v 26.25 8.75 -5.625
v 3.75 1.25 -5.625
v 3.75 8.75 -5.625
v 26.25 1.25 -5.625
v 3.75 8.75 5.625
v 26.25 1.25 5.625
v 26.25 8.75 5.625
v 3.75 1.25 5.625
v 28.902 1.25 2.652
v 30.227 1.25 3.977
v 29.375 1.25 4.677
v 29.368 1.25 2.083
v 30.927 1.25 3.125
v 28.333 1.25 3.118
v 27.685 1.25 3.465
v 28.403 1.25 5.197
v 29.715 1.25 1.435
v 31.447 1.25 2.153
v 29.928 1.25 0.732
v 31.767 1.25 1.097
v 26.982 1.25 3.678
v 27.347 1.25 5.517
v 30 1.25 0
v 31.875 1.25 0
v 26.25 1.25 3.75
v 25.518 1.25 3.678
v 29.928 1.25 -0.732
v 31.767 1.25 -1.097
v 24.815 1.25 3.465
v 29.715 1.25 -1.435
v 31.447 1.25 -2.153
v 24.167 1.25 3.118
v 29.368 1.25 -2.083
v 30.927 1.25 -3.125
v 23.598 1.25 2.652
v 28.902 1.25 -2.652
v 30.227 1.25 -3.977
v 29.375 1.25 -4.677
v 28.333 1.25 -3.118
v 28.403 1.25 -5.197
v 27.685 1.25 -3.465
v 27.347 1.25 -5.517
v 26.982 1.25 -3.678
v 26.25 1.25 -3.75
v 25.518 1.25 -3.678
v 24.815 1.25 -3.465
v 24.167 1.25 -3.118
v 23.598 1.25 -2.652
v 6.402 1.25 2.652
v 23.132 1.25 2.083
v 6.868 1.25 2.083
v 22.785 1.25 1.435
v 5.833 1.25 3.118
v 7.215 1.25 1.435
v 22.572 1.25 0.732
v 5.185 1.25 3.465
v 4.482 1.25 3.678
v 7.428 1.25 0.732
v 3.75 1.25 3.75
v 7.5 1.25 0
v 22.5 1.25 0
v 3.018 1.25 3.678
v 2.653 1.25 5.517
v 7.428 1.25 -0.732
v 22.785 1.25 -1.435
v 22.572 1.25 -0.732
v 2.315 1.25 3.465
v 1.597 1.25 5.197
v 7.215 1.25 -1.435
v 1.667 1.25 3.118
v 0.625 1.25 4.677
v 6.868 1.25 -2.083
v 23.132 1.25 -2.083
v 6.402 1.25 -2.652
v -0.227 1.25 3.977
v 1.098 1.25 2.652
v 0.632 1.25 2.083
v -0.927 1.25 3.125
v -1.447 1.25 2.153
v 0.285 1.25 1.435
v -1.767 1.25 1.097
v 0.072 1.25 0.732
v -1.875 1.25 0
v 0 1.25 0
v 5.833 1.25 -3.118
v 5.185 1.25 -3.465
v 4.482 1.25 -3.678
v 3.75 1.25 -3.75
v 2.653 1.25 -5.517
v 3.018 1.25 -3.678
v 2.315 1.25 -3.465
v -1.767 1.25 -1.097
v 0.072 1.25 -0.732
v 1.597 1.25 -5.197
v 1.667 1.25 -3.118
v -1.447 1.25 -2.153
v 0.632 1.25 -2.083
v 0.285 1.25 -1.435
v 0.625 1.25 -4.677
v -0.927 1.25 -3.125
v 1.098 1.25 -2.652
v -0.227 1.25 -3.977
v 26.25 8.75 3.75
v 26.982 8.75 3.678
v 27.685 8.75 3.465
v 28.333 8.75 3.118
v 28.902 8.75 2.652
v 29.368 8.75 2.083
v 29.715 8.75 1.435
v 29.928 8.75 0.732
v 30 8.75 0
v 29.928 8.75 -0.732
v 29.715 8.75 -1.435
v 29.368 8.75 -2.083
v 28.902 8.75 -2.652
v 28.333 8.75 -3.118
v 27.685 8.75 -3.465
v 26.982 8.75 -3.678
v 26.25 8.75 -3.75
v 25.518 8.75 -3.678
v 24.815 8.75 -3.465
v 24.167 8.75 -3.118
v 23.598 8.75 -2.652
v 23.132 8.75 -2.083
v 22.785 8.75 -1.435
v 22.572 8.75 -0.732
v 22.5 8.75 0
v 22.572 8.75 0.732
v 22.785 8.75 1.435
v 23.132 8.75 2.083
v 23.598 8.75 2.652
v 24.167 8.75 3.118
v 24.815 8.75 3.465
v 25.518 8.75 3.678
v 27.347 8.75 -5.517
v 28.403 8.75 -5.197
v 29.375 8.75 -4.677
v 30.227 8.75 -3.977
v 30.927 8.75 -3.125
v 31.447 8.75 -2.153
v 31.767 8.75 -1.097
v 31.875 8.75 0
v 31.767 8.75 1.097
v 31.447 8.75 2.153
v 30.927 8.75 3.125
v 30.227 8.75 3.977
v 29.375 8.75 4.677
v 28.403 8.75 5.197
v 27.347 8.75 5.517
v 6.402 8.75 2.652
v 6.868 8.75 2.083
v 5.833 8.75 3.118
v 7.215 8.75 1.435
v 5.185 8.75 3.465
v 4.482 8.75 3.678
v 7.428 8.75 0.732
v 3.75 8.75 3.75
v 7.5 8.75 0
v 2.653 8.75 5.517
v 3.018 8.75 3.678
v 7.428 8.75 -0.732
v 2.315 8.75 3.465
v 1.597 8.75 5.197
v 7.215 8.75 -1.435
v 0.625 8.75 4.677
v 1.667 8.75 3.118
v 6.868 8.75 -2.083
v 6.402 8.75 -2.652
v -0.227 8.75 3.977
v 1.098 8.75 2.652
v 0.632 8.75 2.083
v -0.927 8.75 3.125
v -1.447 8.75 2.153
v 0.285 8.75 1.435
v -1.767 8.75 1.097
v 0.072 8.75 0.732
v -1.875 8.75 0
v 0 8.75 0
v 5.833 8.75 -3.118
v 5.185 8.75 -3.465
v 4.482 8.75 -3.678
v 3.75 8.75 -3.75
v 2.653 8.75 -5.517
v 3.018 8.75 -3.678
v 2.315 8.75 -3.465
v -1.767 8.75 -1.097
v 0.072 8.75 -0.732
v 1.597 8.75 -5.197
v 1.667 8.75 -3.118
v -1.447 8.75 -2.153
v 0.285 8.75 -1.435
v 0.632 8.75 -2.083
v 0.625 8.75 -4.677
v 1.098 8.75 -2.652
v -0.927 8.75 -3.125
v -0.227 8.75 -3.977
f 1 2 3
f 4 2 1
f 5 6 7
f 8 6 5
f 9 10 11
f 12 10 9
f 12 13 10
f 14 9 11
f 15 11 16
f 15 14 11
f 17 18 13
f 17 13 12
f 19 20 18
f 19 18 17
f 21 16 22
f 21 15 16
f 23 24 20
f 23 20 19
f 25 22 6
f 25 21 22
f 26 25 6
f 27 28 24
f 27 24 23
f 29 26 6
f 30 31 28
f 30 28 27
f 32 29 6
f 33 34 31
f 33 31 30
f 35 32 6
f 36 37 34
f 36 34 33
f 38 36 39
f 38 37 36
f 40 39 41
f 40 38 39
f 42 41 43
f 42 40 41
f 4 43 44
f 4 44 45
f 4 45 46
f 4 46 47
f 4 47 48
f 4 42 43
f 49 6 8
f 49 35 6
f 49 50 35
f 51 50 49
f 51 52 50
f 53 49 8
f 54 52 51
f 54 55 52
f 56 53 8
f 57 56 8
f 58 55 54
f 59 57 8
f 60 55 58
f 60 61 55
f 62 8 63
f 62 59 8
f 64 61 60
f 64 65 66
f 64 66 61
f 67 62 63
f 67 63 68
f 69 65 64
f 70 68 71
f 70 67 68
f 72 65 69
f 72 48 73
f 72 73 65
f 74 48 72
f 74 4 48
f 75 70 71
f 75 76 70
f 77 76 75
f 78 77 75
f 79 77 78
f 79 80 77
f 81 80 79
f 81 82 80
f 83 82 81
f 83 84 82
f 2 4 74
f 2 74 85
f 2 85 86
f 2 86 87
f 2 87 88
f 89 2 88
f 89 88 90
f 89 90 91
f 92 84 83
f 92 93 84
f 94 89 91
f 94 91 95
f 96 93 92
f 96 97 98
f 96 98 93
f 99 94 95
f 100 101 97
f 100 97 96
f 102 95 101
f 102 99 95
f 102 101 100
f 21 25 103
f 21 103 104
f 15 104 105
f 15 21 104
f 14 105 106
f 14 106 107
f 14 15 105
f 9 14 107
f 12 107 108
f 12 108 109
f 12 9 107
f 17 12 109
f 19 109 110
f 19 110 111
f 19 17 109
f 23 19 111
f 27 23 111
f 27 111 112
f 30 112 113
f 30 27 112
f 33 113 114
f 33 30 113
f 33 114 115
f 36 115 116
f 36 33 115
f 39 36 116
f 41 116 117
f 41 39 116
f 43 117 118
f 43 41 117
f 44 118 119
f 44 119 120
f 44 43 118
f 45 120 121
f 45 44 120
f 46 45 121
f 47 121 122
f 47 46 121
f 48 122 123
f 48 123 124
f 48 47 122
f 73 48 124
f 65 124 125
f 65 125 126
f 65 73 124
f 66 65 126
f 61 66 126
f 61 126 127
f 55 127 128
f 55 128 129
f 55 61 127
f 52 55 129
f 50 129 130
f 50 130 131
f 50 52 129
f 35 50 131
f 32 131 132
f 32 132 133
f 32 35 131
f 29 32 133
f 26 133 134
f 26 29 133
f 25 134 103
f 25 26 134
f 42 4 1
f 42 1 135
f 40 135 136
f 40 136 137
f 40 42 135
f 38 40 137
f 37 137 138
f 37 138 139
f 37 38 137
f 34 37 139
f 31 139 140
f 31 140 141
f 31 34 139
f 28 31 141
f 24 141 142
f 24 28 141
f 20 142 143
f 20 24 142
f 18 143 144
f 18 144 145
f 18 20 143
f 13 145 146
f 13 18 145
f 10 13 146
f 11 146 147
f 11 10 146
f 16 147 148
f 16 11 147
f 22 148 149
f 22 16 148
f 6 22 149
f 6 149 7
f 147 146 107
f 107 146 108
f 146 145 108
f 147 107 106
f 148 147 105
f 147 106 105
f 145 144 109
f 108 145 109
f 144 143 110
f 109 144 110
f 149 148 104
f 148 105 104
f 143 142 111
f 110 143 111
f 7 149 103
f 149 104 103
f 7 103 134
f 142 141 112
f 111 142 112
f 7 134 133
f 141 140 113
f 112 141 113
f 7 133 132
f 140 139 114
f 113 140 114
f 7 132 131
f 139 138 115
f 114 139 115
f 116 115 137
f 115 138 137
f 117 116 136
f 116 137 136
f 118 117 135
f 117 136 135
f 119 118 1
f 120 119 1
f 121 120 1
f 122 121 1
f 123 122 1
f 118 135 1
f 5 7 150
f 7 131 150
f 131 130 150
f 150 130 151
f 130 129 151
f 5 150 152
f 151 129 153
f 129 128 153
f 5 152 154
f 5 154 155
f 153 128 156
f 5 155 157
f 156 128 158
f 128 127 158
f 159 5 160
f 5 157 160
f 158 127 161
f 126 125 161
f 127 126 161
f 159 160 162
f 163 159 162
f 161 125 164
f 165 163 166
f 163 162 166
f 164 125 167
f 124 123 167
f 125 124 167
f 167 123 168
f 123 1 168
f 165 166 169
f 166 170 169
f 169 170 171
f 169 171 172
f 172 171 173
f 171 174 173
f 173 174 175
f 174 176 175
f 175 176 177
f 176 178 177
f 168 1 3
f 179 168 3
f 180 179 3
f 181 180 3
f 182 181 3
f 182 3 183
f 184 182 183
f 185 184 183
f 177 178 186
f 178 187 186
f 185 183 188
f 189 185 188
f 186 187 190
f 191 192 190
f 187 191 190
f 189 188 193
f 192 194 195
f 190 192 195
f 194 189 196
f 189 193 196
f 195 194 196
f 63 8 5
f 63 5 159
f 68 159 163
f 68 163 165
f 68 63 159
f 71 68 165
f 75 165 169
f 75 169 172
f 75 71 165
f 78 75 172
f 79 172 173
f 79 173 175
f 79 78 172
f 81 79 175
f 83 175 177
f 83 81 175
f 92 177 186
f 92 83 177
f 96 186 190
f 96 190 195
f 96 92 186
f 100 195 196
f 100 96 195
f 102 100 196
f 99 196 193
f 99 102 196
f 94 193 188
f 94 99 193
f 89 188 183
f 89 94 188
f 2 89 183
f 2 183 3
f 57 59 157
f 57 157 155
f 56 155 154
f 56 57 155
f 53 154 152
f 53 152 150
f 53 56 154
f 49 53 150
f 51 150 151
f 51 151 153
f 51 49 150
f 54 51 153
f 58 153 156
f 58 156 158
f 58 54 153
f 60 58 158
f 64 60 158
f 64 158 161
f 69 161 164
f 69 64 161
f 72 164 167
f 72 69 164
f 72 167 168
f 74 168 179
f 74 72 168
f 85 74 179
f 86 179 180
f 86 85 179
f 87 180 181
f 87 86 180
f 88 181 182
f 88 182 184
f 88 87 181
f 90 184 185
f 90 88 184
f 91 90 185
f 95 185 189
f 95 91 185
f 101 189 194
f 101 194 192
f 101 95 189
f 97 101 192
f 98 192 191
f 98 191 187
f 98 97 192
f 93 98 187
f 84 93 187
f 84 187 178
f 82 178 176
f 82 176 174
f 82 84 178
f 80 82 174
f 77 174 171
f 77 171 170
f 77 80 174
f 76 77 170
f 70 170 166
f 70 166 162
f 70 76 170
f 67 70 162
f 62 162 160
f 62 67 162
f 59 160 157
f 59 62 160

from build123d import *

# Parameters (mm, degrees)
CROQUIS1_R              = 5
SALIENTE_EXTRUIR1_DEPTH = 10
ESCALA1_SCALE           = 0.75


with BuildPart() as part:
    # Croquis1 → Saliente-Extruir1 (new body)
    with BuildSketch(Plane(origin=(0, 0, 0), x_dir=(1, 0, 0), z_dir=(0, 1, 0))):
        with BuildLine():
            Line((0, 7.5), (30, 7.5))
            ThreePointArc((30, 7.5), (37.5, 0), (30, -7.5))
            Line((30, -7.5), (0, -7.5))
            ThreePointArc((0, -7.5), (-7.5, 0), (0, 7.5))
        make_face()
        with Locations(Location((0, 0, 0), (0, 0, 270))):
            Circle(CROQUIS1_R, mode=Mode.SUBTRACT)
        with Locations(Location((30, 0, 0), (0, 0, 270))):
            Circle(CROQUIS1_R, mode=Mode.SUBTRACT)
    extrude(amount=SALIENTE_EXTRUIR1_DEPTH)


with BuildPart() as part_1:
    # Escala1: scaled about (15, 5, 0)
    add(part.part.scale(ESCALA1_SCALE).moved(Location((3.75, 1.25, 0))))


solid = part_1.part
